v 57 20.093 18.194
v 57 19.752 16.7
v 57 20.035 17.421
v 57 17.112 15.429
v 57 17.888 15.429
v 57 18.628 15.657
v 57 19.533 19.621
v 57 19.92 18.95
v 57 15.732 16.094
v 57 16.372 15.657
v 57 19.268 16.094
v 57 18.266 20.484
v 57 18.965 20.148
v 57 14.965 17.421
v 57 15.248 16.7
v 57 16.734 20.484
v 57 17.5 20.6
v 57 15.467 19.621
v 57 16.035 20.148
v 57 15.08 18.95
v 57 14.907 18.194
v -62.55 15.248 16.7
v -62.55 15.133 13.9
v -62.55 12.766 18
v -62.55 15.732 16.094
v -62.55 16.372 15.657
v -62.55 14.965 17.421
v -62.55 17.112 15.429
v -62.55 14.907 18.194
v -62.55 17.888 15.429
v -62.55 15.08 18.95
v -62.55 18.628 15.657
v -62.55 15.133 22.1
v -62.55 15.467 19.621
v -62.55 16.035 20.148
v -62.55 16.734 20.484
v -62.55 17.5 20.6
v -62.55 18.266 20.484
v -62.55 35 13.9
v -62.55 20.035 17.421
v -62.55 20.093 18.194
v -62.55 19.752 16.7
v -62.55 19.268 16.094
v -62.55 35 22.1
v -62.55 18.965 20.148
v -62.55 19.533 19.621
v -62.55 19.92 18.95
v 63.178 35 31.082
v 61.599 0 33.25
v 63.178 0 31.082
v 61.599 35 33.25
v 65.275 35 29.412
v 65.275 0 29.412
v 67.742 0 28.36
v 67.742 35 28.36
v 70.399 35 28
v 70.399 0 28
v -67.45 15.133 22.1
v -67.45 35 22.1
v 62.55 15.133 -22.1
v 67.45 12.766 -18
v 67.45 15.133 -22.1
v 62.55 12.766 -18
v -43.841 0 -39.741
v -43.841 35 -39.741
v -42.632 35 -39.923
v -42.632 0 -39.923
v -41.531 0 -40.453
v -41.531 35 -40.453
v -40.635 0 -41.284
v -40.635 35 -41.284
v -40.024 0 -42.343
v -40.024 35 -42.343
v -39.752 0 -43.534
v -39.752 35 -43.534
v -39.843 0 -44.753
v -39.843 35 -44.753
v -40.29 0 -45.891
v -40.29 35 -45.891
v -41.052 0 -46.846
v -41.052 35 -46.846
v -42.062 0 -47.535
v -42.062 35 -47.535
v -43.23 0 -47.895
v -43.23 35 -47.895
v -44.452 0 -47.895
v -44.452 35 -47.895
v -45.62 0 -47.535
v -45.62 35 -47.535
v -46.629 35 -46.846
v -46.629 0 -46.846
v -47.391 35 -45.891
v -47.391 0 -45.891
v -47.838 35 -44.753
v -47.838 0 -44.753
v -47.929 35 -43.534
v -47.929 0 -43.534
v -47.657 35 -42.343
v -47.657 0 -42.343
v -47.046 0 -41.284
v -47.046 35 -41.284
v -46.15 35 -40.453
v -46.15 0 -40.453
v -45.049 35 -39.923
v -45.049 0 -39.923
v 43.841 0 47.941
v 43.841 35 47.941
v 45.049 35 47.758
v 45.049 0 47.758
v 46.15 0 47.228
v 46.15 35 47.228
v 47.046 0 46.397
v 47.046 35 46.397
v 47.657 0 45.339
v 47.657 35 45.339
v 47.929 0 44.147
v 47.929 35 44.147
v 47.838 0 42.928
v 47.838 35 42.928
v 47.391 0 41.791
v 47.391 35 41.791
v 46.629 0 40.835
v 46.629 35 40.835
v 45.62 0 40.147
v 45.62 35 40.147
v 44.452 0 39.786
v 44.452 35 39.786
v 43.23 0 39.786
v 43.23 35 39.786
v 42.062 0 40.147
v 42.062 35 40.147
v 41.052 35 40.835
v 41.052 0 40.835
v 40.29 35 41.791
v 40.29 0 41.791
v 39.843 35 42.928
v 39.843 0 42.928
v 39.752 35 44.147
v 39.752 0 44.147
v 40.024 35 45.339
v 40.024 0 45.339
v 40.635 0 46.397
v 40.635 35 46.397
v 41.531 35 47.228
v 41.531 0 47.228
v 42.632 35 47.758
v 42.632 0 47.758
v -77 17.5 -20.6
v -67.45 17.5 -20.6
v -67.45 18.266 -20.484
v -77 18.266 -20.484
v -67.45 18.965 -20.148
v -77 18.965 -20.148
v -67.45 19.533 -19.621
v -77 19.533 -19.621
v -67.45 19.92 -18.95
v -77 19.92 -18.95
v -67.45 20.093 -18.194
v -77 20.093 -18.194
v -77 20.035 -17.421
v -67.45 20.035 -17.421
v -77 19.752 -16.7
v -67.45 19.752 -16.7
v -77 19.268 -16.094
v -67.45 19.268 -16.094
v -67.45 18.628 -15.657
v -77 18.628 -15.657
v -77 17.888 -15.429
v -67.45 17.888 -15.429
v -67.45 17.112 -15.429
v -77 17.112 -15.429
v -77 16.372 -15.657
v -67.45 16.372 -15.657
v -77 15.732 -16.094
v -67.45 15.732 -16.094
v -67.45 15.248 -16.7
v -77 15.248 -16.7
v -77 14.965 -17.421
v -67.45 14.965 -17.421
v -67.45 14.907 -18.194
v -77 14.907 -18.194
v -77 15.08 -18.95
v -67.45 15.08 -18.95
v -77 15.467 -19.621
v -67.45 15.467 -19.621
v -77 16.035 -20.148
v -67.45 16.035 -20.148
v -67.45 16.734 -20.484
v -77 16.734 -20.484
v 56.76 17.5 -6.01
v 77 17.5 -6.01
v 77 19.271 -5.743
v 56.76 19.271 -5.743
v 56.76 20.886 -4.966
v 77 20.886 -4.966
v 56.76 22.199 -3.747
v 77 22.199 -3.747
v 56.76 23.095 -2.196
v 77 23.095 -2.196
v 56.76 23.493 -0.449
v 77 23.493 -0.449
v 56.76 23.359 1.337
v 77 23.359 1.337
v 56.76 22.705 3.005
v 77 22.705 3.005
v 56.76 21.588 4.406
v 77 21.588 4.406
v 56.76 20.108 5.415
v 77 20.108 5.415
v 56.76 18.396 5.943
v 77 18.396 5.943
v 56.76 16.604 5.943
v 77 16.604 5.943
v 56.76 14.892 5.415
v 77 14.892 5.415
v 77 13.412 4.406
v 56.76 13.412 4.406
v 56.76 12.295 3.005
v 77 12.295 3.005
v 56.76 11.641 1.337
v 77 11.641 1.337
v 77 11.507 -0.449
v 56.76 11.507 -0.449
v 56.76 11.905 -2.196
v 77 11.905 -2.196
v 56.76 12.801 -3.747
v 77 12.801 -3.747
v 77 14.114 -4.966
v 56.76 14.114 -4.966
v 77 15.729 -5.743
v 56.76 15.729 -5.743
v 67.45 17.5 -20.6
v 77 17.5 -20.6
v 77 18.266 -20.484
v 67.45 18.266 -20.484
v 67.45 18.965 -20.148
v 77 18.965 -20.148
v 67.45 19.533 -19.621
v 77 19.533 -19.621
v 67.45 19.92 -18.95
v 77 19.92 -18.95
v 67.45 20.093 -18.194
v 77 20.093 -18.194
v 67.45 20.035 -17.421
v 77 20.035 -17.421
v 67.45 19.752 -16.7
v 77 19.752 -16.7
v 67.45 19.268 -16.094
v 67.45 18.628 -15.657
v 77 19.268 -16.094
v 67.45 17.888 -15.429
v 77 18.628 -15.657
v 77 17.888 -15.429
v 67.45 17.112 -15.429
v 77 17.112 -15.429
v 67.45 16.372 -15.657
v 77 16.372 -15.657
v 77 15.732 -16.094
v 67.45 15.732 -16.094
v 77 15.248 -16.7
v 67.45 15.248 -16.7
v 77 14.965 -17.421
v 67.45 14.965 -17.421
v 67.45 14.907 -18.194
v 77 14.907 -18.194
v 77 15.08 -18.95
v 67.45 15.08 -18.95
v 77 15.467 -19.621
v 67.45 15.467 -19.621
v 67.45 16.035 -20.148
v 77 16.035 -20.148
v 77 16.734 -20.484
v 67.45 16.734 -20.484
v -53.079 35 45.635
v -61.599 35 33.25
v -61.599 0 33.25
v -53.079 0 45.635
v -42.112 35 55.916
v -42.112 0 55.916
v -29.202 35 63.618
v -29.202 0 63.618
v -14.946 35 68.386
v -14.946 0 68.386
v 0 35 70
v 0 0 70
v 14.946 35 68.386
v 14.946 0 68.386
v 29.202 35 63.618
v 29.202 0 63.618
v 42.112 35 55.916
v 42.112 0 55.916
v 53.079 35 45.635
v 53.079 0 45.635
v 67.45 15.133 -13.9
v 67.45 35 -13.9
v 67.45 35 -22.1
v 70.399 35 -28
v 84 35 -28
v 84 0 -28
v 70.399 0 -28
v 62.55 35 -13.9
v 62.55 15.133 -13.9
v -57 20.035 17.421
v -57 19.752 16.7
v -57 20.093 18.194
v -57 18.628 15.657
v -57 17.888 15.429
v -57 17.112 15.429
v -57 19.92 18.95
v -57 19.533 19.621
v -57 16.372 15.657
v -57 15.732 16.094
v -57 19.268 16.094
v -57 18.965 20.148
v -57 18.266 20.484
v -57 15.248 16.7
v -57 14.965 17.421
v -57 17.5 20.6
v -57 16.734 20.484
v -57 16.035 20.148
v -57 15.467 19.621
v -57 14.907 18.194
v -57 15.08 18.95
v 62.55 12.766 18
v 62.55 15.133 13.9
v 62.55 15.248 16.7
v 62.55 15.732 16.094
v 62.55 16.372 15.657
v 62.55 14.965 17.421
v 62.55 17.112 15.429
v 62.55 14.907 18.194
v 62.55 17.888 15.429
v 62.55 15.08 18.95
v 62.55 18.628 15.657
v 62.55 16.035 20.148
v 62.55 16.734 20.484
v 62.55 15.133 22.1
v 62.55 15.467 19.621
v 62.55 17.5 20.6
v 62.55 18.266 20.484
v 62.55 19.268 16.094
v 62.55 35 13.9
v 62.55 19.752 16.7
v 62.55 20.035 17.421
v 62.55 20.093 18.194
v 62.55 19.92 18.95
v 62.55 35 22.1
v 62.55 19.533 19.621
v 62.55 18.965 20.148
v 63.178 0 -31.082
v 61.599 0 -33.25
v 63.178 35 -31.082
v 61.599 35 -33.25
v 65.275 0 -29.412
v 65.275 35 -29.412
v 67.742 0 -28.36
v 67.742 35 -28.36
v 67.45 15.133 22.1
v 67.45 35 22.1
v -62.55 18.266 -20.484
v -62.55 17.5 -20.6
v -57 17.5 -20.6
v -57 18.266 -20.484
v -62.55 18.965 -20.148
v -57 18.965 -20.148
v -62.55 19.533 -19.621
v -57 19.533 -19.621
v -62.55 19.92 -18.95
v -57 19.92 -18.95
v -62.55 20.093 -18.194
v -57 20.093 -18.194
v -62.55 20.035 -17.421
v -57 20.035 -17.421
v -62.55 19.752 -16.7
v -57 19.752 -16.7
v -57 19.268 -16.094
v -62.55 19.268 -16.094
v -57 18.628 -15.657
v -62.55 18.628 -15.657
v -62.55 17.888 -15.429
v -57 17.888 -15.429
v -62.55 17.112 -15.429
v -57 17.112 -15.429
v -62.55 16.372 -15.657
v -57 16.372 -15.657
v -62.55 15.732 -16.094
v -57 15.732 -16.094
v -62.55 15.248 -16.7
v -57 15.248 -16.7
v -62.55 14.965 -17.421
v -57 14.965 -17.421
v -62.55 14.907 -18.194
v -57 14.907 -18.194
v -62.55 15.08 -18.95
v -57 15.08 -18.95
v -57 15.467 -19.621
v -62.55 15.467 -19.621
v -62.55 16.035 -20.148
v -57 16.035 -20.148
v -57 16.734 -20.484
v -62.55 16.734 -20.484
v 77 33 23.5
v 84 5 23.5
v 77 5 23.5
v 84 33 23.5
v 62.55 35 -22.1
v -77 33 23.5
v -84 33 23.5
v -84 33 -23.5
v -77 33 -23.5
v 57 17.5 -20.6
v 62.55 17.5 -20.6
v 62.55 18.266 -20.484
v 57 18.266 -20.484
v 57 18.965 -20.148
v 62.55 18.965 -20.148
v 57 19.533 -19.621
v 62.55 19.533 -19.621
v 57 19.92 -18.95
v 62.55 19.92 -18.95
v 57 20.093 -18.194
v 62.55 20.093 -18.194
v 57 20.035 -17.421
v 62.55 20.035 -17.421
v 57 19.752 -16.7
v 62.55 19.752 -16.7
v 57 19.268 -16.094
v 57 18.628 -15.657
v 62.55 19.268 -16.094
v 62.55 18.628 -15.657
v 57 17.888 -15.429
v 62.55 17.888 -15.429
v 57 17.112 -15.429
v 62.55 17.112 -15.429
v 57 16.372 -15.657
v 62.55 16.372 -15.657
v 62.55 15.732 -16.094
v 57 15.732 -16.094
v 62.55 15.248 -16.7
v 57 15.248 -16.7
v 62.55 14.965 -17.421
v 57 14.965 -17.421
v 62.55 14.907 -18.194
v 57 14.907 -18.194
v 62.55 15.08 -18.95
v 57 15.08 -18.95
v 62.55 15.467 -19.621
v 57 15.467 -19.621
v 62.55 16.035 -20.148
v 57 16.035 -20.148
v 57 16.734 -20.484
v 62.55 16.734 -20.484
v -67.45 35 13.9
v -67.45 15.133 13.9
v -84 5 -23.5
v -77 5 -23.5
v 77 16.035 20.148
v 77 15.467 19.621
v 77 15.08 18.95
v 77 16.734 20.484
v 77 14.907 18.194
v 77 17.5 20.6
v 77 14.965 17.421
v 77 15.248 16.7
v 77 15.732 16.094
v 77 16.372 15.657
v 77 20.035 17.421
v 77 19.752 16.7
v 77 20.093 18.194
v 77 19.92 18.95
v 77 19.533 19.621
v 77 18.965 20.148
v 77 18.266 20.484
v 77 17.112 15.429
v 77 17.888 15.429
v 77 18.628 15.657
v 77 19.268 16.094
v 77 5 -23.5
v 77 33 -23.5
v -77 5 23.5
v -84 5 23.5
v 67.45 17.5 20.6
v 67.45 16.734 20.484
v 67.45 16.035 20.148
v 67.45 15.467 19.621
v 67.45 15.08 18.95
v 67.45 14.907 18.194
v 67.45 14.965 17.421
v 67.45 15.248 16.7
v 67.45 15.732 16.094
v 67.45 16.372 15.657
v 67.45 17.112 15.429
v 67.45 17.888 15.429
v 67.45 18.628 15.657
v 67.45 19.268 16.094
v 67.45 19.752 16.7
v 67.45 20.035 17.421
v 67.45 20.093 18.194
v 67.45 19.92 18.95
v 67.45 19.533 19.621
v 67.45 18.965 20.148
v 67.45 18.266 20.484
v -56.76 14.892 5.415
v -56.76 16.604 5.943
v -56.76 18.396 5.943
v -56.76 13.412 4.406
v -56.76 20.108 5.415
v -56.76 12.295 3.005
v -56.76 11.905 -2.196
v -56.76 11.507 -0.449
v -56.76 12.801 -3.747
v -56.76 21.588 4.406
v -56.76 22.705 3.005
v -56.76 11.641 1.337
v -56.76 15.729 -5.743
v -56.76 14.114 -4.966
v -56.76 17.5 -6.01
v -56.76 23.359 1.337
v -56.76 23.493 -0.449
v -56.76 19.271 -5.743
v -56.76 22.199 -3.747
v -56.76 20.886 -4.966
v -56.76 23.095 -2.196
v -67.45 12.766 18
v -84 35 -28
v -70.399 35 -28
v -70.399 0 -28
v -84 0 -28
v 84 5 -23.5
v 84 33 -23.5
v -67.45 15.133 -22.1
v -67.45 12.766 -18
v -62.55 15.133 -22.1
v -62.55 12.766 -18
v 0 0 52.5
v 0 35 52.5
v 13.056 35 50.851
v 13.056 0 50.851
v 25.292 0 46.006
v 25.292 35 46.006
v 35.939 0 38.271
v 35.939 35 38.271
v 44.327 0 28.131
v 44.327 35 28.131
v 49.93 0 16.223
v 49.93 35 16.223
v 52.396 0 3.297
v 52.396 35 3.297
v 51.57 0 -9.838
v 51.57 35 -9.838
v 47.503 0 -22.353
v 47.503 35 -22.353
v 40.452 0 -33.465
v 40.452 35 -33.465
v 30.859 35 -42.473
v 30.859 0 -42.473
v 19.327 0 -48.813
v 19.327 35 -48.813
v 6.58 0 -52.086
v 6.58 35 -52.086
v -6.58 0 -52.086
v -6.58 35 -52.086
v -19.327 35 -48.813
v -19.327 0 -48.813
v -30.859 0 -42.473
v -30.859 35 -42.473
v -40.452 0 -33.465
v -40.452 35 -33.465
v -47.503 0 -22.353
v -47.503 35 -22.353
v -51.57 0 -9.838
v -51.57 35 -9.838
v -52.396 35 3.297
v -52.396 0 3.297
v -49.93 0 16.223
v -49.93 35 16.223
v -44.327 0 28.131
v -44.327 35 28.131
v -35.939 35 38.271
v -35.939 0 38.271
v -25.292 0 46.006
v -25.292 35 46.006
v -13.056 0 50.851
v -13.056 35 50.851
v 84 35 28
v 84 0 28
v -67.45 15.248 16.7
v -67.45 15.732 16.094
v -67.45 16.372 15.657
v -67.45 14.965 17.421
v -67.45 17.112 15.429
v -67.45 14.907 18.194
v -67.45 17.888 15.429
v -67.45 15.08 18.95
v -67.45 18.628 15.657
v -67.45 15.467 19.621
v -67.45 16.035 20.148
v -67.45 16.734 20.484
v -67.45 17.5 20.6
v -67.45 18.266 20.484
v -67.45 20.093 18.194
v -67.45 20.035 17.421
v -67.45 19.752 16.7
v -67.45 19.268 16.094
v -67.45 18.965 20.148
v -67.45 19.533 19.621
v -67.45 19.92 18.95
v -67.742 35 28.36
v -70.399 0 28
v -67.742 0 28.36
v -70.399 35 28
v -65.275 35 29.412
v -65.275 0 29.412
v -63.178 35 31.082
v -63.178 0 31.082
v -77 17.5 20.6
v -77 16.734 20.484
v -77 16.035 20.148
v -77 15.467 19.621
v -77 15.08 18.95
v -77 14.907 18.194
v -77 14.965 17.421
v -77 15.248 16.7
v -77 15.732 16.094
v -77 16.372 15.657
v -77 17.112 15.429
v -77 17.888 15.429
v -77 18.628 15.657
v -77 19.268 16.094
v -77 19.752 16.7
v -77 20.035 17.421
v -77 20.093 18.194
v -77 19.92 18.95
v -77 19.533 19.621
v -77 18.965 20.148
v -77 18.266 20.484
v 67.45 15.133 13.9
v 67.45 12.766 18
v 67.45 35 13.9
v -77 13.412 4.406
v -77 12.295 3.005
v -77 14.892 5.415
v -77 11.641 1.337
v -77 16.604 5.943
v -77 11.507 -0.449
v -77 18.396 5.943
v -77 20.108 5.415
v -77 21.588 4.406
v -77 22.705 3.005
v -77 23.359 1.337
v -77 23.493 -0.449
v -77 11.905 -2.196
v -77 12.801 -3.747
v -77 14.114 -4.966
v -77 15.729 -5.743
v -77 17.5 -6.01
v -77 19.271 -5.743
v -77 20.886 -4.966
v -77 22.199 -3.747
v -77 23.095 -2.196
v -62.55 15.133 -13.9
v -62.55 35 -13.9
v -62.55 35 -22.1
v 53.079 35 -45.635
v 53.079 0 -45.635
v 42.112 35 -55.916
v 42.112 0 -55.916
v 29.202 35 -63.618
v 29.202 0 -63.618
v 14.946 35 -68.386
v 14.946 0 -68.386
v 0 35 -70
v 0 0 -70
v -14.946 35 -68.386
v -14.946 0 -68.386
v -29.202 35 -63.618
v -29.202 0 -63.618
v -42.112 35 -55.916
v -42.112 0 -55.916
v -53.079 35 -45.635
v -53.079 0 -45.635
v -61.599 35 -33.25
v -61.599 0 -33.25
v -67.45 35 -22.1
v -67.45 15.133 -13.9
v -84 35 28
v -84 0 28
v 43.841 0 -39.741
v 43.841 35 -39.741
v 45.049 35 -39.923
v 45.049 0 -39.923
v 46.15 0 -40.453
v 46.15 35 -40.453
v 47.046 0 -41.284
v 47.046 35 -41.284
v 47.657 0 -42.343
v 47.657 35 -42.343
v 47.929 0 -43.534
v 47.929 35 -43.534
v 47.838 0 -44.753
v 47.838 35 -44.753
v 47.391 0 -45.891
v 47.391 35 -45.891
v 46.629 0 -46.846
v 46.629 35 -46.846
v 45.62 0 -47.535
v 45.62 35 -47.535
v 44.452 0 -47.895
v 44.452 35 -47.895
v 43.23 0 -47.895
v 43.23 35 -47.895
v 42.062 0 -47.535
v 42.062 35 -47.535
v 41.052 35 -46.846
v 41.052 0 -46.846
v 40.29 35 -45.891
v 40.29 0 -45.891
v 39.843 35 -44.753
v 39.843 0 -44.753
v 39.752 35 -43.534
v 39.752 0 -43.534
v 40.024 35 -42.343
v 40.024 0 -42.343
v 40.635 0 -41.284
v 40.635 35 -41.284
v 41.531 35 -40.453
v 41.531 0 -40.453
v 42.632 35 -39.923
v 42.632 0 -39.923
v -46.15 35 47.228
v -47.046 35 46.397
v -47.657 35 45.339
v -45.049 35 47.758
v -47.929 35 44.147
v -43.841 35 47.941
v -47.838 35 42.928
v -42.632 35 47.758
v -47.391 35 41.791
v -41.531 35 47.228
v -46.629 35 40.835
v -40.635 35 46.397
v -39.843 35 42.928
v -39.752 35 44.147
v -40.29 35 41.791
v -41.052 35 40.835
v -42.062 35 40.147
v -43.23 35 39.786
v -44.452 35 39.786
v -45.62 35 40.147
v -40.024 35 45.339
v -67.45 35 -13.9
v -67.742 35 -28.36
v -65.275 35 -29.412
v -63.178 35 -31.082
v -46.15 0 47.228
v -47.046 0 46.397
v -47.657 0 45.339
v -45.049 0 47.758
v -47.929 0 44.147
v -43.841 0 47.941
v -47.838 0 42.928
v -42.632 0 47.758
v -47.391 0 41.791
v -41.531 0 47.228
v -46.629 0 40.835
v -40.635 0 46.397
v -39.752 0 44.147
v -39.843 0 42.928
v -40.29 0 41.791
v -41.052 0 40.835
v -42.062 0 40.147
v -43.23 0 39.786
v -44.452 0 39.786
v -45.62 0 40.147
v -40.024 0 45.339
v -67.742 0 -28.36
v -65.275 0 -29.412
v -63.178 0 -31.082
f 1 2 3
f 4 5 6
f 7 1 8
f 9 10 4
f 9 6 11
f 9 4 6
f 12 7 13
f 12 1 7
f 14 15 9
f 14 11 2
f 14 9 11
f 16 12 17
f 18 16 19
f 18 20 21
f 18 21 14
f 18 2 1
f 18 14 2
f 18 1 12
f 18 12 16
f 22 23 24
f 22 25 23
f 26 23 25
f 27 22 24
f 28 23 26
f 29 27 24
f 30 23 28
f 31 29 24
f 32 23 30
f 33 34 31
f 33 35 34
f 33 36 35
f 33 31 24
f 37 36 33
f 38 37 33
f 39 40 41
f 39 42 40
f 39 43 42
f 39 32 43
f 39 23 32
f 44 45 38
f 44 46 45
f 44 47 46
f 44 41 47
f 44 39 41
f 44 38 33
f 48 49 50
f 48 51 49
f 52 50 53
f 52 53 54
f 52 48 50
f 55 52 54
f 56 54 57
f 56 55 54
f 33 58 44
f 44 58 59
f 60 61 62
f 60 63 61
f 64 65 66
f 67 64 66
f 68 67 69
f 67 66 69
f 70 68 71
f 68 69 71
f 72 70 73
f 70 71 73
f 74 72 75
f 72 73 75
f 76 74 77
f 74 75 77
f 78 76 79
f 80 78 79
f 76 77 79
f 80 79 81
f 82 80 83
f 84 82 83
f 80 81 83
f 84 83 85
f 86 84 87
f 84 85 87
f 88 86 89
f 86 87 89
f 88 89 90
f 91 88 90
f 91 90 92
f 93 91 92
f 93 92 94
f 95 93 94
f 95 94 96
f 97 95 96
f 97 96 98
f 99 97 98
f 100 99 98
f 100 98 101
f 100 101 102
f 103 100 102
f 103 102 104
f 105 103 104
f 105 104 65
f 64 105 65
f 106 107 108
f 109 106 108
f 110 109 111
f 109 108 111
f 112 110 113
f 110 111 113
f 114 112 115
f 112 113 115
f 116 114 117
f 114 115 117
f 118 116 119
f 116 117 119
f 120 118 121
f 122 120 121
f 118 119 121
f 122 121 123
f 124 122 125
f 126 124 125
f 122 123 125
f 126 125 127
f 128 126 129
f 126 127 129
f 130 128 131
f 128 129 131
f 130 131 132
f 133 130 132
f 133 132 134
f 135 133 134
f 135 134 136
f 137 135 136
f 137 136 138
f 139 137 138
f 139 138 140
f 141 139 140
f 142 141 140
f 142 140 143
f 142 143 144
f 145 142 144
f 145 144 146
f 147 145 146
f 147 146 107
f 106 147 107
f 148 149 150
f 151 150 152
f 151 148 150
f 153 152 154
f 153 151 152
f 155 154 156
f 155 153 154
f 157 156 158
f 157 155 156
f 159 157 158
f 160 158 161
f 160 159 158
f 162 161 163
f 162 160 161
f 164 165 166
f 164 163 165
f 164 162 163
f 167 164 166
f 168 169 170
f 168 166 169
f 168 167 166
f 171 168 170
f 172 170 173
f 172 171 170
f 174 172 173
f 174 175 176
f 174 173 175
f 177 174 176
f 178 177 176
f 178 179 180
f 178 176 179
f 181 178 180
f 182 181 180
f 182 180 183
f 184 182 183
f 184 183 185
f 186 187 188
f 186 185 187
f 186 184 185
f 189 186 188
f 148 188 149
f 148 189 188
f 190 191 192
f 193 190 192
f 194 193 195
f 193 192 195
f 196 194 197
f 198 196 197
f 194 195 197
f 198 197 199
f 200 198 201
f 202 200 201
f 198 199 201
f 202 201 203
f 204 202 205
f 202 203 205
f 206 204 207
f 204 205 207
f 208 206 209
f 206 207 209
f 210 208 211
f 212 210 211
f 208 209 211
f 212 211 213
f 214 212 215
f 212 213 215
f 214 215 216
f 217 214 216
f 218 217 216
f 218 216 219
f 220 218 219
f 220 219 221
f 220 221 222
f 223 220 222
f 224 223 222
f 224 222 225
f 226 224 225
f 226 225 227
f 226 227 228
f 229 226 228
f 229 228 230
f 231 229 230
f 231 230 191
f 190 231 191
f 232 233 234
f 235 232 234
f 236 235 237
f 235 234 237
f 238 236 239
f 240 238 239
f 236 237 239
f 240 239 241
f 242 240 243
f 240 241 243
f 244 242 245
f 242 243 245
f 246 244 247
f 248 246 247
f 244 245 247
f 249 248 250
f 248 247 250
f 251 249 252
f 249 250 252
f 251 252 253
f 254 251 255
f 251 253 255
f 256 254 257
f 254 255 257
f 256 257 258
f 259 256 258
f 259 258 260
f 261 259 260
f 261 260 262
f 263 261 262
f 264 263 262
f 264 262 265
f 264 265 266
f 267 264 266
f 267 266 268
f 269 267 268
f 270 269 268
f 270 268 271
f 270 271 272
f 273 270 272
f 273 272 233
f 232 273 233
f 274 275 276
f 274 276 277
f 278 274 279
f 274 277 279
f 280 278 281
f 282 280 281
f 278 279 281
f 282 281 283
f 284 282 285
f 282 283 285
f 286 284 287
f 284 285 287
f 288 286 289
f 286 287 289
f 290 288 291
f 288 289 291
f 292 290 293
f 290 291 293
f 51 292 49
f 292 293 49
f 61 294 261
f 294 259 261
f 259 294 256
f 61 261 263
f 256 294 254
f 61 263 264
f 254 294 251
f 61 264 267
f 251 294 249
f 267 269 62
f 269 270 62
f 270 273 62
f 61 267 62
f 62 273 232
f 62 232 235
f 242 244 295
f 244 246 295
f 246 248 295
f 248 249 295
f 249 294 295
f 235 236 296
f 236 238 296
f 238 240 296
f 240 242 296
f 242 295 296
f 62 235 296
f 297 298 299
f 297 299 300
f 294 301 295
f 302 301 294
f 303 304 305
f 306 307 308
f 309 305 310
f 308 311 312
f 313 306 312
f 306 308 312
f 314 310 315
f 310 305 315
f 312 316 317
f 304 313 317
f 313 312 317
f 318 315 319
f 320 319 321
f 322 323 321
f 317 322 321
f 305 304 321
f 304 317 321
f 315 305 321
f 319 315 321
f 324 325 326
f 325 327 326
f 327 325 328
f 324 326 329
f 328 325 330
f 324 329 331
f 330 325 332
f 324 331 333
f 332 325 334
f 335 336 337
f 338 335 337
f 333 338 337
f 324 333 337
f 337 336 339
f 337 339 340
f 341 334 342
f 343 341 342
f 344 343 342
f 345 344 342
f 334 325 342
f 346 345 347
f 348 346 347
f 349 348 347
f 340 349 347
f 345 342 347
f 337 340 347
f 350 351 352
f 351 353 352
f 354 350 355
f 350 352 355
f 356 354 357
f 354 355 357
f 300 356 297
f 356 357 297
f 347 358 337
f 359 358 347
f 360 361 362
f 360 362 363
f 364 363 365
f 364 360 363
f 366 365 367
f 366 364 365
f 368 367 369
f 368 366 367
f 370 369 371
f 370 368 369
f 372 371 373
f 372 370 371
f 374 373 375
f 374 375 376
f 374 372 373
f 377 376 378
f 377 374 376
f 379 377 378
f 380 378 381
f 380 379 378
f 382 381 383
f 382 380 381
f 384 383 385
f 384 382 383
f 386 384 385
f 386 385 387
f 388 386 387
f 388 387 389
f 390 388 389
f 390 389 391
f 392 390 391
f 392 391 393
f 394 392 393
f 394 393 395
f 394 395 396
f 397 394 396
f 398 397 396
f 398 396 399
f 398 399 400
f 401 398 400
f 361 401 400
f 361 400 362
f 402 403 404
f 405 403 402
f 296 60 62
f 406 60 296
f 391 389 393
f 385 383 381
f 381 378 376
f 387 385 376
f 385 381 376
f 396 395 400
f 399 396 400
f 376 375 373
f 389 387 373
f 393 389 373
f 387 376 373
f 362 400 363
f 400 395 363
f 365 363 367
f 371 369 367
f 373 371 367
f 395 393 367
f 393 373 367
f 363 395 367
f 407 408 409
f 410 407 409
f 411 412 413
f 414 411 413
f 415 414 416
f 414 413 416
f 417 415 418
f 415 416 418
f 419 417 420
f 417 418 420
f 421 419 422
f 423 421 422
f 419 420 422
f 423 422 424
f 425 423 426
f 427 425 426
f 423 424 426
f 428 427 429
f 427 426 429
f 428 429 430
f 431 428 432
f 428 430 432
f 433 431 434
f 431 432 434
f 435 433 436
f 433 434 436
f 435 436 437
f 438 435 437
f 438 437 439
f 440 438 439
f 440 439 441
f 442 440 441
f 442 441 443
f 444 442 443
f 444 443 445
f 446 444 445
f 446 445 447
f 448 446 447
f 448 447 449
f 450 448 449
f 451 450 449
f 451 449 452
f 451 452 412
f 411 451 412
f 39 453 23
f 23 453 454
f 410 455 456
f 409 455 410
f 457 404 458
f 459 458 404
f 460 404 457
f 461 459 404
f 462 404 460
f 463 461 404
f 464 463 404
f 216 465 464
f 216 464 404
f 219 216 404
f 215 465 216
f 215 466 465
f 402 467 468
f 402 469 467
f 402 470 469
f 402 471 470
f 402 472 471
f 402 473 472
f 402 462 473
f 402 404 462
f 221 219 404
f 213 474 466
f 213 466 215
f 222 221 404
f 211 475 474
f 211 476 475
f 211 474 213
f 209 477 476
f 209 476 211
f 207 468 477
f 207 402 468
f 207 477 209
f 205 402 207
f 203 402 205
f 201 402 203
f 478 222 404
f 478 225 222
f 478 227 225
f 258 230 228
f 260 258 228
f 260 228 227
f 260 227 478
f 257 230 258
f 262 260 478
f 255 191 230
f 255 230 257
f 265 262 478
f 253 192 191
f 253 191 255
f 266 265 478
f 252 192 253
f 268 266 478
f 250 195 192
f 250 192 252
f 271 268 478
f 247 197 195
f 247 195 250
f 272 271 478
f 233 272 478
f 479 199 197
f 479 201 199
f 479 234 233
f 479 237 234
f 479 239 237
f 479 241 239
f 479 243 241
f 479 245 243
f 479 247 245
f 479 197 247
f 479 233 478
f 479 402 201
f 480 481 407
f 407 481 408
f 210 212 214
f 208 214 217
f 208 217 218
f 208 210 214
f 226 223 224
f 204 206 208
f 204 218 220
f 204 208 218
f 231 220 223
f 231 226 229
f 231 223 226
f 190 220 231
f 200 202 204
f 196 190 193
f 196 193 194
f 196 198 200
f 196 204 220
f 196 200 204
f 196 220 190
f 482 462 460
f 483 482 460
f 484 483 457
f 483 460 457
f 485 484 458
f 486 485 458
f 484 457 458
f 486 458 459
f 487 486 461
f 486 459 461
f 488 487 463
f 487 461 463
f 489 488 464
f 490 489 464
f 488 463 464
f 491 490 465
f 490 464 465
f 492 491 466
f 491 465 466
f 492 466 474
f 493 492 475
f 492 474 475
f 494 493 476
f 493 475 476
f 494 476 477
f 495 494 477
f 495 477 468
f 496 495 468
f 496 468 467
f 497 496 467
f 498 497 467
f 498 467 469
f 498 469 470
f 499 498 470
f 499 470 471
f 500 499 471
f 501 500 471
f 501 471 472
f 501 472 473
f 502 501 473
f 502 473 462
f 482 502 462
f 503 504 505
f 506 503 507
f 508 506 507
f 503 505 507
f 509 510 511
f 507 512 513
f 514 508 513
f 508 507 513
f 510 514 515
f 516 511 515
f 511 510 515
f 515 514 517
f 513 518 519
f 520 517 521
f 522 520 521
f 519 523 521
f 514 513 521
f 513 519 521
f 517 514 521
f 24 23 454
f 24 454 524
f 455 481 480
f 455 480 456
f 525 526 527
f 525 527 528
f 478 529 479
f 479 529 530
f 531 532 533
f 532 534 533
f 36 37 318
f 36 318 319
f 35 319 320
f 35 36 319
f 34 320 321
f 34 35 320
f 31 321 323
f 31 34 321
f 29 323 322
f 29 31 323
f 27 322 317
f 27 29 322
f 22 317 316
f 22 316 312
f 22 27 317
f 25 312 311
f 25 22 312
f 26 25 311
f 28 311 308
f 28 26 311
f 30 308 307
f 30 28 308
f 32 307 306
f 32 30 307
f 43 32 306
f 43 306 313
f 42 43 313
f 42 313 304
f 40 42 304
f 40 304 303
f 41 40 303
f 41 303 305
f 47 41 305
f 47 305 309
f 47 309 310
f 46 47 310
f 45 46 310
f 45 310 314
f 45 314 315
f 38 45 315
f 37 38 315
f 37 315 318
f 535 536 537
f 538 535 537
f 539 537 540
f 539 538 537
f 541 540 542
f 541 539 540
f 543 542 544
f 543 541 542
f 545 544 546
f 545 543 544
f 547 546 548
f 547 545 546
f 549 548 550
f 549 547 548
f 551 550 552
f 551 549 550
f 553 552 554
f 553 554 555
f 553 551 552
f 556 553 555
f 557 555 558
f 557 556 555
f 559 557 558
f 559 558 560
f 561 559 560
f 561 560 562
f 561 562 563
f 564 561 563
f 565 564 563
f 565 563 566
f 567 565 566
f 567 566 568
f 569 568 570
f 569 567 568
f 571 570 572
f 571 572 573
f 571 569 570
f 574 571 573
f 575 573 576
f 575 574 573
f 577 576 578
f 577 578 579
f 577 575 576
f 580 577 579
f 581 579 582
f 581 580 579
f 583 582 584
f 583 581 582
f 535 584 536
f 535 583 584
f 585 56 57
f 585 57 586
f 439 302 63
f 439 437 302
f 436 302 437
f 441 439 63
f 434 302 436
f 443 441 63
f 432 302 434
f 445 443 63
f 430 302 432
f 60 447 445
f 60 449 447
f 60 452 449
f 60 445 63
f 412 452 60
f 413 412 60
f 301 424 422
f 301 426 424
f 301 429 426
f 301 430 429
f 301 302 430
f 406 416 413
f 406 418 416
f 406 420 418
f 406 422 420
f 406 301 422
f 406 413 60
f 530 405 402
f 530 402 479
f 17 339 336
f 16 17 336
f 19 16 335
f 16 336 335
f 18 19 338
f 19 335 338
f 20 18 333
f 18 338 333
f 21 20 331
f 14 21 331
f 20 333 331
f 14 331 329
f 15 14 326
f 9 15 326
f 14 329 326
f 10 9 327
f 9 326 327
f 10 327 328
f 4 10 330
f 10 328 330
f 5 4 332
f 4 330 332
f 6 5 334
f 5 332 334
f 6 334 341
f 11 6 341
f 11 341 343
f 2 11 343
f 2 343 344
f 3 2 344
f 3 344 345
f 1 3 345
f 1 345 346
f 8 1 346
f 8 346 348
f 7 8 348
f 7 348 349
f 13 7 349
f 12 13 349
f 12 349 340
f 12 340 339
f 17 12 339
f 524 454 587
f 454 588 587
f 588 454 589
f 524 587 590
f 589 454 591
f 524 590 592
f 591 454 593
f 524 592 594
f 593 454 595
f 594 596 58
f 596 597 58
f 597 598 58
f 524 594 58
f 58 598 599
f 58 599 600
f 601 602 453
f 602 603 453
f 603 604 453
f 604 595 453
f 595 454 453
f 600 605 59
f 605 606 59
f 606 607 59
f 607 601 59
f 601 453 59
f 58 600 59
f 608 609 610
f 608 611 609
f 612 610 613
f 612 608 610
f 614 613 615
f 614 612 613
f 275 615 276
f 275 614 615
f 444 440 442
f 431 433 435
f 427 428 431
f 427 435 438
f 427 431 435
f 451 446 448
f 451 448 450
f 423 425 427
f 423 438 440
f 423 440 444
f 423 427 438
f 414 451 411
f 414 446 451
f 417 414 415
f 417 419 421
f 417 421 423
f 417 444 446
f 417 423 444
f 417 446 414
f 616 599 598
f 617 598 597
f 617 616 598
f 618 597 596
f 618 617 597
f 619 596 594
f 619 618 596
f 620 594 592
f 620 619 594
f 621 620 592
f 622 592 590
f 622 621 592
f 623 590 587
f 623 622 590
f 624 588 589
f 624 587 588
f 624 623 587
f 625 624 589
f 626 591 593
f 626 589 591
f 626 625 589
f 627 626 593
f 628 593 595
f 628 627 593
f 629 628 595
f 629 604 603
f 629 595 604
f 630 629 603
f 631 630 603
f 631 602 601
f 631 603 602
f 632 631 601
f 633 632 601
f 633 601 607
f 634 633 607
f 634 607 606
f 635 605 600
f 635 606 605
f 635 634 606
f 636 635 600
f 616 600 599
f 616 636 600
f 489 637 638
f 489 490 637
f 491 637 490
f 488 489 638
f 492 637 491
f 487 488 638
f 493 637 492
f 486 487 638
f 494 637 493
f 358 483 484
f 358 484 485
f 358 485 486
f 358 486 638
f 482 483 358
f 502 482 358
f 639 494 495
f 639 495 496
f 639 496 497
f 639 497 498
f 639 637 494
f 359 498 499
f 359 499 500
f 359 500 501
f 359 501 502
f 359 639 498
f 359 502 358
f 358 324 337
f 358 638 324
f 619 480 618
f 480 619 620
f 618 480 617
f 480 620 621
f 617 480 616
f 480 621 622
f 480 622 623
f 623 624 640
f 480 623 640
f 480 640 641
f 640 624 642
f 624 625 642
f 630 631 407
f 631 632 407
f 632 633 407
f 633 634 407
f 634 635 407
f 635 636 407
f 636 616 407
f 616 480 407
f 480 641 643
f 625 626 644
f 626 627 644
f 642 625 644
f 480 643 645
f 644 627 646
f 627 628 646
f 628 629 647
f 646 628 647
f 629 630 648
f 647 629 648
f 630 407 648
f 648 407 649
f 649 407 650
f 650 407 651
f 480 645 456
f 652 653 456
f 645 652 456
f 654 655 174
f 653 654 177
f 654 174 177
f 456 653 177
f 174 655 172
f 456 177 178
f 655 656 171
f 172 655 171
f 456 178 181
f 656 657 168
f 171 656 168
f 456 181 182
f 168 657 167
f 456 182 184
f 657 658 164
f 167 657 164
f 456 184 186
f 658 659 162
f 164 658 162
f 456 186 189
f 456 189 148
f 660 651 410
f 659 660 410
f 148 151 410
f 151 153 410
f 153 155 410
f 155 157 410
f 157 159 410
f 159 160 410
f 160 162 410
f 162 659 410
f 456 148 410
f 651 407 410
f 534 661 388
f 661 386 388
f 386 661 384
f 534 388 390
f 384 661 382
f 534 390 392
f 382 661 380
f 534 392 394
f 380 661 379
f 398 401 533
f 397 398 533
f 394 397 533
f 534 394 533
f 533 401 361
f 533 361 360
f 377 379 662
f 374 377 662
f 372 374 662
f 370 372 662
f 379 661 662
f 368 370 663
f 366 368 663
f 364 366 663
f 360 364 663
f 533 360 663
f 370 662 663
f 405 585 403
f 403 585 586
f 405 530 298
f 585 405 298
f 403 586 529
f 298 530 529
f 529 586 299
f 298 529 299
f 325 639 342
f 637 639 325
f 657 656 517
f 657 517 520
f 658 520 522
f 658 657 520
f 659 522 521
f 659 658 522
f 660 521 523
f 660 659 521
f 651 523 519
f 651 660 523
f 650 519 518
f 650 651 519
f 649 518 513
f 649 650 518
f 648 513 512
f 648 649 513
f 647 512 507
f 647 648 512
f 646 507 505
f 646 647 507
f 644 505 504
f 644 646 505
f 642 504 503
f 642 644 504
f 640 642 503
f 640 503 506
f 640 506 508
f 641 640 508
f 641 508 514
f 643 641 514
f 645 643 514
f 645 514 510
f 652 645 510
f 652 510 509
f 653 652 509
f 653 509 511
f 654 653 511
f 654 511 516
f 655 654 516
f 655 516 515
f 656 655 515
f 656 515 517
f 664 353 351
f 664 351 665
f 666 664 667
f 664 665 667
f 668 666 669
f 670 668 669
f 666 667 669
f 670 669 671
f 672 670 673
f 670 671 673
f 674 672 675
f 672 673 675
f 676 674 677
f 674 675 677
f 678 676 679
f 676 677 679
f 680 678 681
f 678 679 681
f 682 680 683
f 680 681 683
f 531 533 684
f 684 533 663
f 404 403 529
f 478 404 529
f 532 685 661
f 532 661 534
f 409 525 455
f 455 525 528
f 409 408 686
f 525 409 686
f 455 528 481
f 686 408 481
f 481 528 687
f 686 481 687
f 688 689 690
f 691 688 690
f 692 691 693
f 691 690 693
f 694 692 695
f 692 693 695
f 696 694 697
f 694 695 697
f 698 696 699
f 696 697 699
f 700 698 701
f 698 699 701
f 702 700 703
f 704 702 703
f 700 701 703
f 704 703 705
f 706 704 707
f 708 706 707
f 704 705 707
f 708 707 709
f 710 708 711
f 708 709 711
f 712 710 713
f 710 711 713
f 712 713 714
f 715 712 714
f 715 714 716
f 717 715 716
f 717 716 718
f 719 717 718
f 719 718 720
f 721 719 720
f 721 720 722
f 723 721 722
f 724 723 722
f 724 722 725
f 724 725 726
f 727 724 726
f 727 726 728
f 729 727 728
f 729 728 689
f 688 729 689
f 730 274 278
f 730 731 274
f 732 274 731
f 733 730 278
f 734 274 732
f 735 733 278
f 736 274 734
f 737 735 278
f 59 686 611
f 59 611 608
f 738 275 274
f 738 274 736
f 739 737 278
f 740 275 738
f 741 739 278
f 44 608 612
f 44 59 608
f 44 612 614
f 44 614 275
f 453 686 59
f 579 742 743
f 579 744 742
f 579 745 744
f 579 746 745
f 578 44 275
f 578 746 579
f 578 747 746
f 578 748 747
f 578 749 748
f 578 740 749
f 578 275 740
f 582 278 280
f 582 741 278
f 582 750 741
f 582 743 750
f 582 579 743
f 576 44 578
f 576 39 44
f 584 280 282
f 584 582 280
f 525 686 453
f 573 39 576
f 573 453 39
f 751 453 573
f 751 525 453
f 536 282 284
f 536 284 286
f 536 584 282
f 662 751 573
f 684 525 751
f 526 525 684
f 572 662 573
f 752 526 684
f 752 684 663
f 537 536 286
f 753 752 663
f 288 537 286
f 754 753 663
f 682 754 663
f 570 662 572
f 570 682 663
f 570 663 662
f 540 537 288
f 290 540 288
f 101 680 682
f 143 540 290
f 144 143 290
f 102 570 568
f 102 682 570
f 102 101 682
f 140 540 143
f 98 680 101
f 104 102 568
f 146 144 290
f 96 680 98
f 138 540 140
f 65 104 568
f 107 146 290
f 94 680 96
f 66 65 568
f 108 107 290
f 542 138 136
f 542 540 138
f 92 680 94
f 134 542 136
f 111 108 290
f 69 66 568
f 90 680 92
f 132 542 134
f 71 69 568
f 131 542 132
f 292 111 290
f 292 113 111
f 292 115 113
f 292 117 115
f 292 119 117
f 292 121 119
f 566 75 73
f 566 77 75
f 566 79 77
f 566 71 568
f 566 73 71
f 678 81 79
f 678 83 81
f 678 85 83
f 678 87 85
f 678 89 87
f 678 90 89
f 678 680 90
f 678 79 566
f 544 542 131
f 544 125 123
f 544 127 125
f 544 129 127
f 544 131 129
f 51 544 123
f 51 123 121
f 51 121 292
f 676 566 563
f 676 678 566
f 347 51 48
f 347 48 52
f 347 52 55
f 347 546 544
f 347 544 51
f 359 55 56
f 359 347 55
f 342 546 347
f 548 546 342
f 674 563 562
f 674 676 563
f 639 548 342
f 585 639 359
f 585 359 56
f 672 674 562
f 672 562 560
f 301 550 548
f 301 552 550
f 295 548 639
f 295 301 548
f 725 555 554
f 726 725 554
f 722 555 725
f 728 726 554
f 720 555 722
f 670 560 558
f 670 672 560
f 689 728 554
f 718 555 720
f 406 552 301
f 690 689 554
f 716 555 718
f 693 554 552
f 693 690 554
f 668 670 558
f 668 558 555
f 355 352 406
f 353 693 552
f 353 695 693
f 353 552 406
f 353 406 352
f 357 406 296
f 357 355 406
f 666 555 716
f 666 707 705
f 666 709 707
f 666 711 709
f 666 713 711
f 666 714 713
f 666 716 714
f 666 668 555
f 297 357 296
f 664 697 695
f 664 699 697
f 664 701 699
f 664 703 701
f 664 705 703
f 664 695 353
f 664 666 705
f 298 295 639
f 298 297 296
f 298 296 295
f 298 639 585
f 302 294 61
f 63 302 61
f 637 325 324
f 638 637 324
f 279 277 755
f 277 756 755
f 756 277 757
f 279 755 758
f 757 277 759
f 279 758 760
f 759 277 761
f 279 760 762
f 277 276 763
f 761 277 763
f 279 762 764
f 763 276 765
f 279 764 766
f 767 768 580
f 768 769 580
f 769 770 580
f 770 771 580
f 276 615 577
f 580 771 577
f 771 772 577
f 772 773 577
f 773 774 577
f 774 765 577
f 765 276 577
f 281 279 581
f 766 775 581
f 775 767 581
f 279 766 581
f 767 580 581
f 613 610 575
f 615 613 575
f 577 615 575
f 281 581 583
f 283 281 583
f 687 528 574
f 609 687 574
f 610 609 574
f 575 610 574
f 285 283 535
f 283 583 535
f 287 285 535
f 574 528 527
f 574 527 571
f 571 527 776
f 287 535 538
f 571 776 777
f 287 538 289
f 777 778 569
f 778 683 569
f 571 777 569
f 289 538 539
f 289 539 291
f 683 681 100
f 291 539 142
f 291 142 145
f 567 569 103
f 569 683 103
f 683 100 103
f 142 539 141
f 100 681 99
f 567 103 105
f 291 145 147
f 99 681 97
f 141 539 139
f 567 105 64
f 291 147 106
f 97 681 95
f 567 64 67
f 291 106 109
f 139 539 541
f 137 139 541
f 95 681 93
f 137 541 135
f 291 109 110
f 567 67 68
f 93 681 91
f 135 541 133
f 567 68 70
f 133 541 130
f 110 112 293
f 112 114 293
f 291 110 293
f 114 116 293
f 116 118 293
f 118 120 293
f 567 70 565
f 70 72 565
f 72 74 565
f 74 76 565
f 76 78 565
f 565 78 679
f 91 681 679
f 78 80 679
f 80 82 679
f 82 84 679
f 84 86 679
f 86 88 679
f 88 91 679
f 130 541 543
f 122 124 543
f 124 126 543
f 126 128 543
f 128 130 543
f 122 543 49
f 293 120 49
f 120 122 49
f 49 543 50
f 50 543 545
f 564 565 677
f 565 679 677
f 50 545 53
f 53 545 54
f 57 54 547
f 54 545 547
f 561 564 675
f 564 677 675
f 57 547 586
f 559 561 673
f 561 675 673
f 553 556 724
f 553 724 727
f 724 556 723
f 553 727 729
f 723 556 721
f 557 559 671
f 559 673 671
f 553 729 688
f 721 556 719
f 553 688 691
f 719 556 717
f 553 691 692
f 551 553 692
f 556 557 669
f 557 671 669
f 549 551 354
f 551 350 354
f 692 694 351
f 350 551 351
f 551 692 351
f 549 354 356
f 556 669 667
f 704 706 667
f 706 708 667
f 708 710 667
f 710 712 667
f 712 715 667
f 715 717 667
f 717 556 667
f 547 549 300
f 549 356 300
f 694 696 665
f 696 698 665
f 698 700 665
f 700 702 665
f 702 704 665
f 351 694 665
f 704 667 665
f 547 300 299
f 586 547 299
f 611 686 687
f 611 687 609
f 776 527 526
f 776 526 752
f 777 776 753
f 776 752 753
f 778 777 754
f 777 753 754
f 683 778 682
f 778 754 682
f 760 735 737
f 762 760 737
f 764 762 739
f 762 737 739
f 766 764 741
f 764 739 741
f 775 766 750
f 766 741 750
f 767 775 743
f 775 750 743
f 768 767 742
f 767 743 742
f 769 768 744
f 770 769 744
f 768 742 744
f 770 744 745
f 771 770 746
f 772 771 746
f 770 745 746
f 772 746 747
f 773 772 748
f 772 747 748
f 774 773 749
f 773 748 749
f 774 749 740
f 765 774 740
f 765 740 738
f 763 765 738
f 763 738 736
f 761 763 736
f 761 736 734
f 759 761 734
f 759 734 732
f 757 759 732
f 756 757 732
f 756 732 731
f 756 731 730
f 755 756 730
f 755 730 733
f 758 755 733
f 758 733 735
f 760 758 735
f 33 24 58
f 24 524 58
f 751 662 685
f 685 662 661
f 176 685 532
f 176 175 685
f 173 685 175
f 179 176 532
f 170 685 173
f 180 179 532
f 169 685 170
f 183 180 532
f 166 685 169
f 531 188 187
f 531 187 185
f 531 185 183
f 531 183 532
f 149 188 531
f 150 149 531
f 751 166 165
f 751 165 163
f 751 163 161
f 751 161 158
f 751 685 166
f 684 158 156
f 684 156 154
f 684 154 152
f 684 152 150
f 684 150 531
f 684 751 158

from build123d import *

# Parameters (mm, degrees)
IZIM1_R                     = 52.5
Y_KSEKLIK_EKSTR_ZYON1_DEPTH = 35
IZIM2_R                     = 6.01
KES_EKSTR_ZYON1_DEPTH       = 27.24
IZIM3_W                     = 47
IZIM3_H                     = 28
KES_EKSTR_ZYON2_DEPTH       = 7
IZIM4_R                     = 2.6
KES_EKSTR_ZYON3_DEPTH       = 20
KES_EKSTR_ZYON4_DEPTH       = 2.45
IZIM7_R                     = 4.1
KES_EKSTR_ZYON5_DEPTH       = 115.808536268
RADYUS1_R                   = 10


with BuildPart() as part:
    # Çizim1 → Yükseklik-Ekstrüzyon1 (new body)
    with BuildSketch(Plane(origin=(0, 0, 0), x_dir=(1, 0, 0), z_dir=(0, 1, 0))):
        with BuildLine():
            Line((-64.156059729, 28), (-84, 28))
            Line((-84, 28), (-84, -28))
            Line((-84, -28), (-64.156059729, -28))
            ThreePointArc((-64.156059729, -28), (0, -70), (64.156059729, -28))
            Line((64.156059729, -28), (84, -28))
            Line((84, -28), (84, 28))
            Line((84, 28), (64.156059729, 28))
            ThreePointArc((64.156059729, 28), (0, 70), (-64.156059729, 28))
        make_face()
        with Locations(Location((0, 0, 0), (0, 0, 270))):
            Circle(IZIM1_R, mode=Mode.SUBTRACT)
    extrude(amount=Y_KSEKLIK_EKSTR_ZYON1_DEPTH)

    # Çizim2 → Kes-Ekstrüzyon1 (cut)
    with BuildSketch(Plane(origin=(84, 0, 0), x_dir=(0, 0, -1), z_dir=(1, 0, 0))):
        with Locations((0, 17.5)):
            Circle(IZIM2_R)
    kes_ekstr_zyon1 = extrude(amount=-KES_EKSTR_ZYON1_DEPTH, mode=Mode.SUBTRACT)

    # Aynalama1: Kes-Ekstrüzyon1 across plane
    add(kes_ekstr_zyon1.mirror(Plane(origin=(0, 0, 0), x_dir=(0, 0, 1), z_dir=(1, 0, 0))), mode=Mode.SUBTRACT)

    # Çizim3 → Kes-Ekstrüzyon2 (cut)
    with BuildSketch(Plane(origin=(84, 0, 0), x_dir=(0, 0, -1), z_dir=(1, 0, 0))):
        with Locations((0, 19)):
            Rectangle(IZIM3_W, IZIM3_H)
    kes_ekstr_zyon2 = extrude(amount=-KES_EKSTR_ZYON2_DEPTH, mode=Mode.SUBTRACT)

    # Aynalama2: Kes-Ekstrüzyon2 across plane
    add(kes_ekstr_zyon2.mirror(Plane(origin=(0, 0, 0), x_dir=(0, 0, 1), z_dir=(1, 0, 0))), mode=Mode.SUBTRACT)

    # Çizim4 → Kes-Ekstrüzyon3 (cut)
    with BuildSketch(Plane(origin=(77, 0, 0), x_dir=(0, 0, -1), z_dir=(1, 0, 0))):
        with Locations((18, 17.5)):
            Circle(IZIM4_R)
        with Locations(Location((-18, 17.5, 0), (0, 0, 180))):
            Circle(IZIM4_R)
    kes_ekstr_zyon3 = extrude(amount=-KES_EKSTR_ZYON3_DEPTH, mode=Mode.SUBTRACT)

    # Aynalama3: Kes-Ekstrüzyon3 across plane
    add(kes_ekstr_zyon3.mirror(Plane(origin=(0, 0, 0), x_dir=(0, 0, 1), z_dir=(1, 0, 0))), mode=Mode.SUBTRACT)

    # Çizim6 → Kes-Ekstrüzyon4 (cut, symmetric)
    with BuildSketch(Plane.ZY.offset(65)):
        Polygon((-22.1, 35), (-13.9, 35), (-13.9, 15.132863896), (-18, 12.765727793), (-22.1, 15.132863896), align=None)
        Polygon((18, 12.765727793), (22.1, 15.132863896), (22.1, 35), (13.9, 35), (13.9, 15.132863896), align=None)
    kes_ekstr_zyon4 = extrude(amount=KES_EKSTR_ZYON4_DEPTH, both=True, mode=Mode.SUBTRACT)

    # Aynalama4: Kes-Ekstrüzyon4 across plane
    add(kes_ekstr_zyon4.mirror(Plane(origin=(0, 0, 0), x_dir=(0, 0, 1), z_dir=(1, 0, 0))), mode=Mode.SUBTRACT)

    # Çizim7 → Kes-Ekstrüzyon5 (cut, through all)
    with BuildSketch(Plane(origin=(0, 35, 0), x_dir=(1, 0, 0), z_dir=(0, 1, 0))):
        with Locations(Location((43.840620434, -43.840620434, 0), (0, 0, 270))):
            Circle(IZIM7_R)
        with Locations(Location((-43.840620434, -43.840620434, 0), (0, 0, 270))):
            Circle(IZIM7_R)
        with Locations(Location((-43.840620434, 43.840620434, 0), (0, 0, 270))):
            Circle(IZIM7_R)
        with Locations(Location((43.840620434, 43.840620434, 0), (0, 0, 270))):
            Circle(IZIM7_R)
    extrude(amount=-KES_EKSTR_ZYON5_DEPTH, mode=Mode.SUBTRACT)

    # Radyus1
    radyus1_edges = [part.edges().sort_by_distance(p)[0] for p in [
        (64.156059729, 17.5, -28),
        (64.156059729, 17.5, 28),
        (-64.156059729, 17.5, 28),
        (-64.156059729, 17.5, -28),
    ]]
    fillet(radyus1_edges, radius=RADYUS1_R)


solid = part.part
